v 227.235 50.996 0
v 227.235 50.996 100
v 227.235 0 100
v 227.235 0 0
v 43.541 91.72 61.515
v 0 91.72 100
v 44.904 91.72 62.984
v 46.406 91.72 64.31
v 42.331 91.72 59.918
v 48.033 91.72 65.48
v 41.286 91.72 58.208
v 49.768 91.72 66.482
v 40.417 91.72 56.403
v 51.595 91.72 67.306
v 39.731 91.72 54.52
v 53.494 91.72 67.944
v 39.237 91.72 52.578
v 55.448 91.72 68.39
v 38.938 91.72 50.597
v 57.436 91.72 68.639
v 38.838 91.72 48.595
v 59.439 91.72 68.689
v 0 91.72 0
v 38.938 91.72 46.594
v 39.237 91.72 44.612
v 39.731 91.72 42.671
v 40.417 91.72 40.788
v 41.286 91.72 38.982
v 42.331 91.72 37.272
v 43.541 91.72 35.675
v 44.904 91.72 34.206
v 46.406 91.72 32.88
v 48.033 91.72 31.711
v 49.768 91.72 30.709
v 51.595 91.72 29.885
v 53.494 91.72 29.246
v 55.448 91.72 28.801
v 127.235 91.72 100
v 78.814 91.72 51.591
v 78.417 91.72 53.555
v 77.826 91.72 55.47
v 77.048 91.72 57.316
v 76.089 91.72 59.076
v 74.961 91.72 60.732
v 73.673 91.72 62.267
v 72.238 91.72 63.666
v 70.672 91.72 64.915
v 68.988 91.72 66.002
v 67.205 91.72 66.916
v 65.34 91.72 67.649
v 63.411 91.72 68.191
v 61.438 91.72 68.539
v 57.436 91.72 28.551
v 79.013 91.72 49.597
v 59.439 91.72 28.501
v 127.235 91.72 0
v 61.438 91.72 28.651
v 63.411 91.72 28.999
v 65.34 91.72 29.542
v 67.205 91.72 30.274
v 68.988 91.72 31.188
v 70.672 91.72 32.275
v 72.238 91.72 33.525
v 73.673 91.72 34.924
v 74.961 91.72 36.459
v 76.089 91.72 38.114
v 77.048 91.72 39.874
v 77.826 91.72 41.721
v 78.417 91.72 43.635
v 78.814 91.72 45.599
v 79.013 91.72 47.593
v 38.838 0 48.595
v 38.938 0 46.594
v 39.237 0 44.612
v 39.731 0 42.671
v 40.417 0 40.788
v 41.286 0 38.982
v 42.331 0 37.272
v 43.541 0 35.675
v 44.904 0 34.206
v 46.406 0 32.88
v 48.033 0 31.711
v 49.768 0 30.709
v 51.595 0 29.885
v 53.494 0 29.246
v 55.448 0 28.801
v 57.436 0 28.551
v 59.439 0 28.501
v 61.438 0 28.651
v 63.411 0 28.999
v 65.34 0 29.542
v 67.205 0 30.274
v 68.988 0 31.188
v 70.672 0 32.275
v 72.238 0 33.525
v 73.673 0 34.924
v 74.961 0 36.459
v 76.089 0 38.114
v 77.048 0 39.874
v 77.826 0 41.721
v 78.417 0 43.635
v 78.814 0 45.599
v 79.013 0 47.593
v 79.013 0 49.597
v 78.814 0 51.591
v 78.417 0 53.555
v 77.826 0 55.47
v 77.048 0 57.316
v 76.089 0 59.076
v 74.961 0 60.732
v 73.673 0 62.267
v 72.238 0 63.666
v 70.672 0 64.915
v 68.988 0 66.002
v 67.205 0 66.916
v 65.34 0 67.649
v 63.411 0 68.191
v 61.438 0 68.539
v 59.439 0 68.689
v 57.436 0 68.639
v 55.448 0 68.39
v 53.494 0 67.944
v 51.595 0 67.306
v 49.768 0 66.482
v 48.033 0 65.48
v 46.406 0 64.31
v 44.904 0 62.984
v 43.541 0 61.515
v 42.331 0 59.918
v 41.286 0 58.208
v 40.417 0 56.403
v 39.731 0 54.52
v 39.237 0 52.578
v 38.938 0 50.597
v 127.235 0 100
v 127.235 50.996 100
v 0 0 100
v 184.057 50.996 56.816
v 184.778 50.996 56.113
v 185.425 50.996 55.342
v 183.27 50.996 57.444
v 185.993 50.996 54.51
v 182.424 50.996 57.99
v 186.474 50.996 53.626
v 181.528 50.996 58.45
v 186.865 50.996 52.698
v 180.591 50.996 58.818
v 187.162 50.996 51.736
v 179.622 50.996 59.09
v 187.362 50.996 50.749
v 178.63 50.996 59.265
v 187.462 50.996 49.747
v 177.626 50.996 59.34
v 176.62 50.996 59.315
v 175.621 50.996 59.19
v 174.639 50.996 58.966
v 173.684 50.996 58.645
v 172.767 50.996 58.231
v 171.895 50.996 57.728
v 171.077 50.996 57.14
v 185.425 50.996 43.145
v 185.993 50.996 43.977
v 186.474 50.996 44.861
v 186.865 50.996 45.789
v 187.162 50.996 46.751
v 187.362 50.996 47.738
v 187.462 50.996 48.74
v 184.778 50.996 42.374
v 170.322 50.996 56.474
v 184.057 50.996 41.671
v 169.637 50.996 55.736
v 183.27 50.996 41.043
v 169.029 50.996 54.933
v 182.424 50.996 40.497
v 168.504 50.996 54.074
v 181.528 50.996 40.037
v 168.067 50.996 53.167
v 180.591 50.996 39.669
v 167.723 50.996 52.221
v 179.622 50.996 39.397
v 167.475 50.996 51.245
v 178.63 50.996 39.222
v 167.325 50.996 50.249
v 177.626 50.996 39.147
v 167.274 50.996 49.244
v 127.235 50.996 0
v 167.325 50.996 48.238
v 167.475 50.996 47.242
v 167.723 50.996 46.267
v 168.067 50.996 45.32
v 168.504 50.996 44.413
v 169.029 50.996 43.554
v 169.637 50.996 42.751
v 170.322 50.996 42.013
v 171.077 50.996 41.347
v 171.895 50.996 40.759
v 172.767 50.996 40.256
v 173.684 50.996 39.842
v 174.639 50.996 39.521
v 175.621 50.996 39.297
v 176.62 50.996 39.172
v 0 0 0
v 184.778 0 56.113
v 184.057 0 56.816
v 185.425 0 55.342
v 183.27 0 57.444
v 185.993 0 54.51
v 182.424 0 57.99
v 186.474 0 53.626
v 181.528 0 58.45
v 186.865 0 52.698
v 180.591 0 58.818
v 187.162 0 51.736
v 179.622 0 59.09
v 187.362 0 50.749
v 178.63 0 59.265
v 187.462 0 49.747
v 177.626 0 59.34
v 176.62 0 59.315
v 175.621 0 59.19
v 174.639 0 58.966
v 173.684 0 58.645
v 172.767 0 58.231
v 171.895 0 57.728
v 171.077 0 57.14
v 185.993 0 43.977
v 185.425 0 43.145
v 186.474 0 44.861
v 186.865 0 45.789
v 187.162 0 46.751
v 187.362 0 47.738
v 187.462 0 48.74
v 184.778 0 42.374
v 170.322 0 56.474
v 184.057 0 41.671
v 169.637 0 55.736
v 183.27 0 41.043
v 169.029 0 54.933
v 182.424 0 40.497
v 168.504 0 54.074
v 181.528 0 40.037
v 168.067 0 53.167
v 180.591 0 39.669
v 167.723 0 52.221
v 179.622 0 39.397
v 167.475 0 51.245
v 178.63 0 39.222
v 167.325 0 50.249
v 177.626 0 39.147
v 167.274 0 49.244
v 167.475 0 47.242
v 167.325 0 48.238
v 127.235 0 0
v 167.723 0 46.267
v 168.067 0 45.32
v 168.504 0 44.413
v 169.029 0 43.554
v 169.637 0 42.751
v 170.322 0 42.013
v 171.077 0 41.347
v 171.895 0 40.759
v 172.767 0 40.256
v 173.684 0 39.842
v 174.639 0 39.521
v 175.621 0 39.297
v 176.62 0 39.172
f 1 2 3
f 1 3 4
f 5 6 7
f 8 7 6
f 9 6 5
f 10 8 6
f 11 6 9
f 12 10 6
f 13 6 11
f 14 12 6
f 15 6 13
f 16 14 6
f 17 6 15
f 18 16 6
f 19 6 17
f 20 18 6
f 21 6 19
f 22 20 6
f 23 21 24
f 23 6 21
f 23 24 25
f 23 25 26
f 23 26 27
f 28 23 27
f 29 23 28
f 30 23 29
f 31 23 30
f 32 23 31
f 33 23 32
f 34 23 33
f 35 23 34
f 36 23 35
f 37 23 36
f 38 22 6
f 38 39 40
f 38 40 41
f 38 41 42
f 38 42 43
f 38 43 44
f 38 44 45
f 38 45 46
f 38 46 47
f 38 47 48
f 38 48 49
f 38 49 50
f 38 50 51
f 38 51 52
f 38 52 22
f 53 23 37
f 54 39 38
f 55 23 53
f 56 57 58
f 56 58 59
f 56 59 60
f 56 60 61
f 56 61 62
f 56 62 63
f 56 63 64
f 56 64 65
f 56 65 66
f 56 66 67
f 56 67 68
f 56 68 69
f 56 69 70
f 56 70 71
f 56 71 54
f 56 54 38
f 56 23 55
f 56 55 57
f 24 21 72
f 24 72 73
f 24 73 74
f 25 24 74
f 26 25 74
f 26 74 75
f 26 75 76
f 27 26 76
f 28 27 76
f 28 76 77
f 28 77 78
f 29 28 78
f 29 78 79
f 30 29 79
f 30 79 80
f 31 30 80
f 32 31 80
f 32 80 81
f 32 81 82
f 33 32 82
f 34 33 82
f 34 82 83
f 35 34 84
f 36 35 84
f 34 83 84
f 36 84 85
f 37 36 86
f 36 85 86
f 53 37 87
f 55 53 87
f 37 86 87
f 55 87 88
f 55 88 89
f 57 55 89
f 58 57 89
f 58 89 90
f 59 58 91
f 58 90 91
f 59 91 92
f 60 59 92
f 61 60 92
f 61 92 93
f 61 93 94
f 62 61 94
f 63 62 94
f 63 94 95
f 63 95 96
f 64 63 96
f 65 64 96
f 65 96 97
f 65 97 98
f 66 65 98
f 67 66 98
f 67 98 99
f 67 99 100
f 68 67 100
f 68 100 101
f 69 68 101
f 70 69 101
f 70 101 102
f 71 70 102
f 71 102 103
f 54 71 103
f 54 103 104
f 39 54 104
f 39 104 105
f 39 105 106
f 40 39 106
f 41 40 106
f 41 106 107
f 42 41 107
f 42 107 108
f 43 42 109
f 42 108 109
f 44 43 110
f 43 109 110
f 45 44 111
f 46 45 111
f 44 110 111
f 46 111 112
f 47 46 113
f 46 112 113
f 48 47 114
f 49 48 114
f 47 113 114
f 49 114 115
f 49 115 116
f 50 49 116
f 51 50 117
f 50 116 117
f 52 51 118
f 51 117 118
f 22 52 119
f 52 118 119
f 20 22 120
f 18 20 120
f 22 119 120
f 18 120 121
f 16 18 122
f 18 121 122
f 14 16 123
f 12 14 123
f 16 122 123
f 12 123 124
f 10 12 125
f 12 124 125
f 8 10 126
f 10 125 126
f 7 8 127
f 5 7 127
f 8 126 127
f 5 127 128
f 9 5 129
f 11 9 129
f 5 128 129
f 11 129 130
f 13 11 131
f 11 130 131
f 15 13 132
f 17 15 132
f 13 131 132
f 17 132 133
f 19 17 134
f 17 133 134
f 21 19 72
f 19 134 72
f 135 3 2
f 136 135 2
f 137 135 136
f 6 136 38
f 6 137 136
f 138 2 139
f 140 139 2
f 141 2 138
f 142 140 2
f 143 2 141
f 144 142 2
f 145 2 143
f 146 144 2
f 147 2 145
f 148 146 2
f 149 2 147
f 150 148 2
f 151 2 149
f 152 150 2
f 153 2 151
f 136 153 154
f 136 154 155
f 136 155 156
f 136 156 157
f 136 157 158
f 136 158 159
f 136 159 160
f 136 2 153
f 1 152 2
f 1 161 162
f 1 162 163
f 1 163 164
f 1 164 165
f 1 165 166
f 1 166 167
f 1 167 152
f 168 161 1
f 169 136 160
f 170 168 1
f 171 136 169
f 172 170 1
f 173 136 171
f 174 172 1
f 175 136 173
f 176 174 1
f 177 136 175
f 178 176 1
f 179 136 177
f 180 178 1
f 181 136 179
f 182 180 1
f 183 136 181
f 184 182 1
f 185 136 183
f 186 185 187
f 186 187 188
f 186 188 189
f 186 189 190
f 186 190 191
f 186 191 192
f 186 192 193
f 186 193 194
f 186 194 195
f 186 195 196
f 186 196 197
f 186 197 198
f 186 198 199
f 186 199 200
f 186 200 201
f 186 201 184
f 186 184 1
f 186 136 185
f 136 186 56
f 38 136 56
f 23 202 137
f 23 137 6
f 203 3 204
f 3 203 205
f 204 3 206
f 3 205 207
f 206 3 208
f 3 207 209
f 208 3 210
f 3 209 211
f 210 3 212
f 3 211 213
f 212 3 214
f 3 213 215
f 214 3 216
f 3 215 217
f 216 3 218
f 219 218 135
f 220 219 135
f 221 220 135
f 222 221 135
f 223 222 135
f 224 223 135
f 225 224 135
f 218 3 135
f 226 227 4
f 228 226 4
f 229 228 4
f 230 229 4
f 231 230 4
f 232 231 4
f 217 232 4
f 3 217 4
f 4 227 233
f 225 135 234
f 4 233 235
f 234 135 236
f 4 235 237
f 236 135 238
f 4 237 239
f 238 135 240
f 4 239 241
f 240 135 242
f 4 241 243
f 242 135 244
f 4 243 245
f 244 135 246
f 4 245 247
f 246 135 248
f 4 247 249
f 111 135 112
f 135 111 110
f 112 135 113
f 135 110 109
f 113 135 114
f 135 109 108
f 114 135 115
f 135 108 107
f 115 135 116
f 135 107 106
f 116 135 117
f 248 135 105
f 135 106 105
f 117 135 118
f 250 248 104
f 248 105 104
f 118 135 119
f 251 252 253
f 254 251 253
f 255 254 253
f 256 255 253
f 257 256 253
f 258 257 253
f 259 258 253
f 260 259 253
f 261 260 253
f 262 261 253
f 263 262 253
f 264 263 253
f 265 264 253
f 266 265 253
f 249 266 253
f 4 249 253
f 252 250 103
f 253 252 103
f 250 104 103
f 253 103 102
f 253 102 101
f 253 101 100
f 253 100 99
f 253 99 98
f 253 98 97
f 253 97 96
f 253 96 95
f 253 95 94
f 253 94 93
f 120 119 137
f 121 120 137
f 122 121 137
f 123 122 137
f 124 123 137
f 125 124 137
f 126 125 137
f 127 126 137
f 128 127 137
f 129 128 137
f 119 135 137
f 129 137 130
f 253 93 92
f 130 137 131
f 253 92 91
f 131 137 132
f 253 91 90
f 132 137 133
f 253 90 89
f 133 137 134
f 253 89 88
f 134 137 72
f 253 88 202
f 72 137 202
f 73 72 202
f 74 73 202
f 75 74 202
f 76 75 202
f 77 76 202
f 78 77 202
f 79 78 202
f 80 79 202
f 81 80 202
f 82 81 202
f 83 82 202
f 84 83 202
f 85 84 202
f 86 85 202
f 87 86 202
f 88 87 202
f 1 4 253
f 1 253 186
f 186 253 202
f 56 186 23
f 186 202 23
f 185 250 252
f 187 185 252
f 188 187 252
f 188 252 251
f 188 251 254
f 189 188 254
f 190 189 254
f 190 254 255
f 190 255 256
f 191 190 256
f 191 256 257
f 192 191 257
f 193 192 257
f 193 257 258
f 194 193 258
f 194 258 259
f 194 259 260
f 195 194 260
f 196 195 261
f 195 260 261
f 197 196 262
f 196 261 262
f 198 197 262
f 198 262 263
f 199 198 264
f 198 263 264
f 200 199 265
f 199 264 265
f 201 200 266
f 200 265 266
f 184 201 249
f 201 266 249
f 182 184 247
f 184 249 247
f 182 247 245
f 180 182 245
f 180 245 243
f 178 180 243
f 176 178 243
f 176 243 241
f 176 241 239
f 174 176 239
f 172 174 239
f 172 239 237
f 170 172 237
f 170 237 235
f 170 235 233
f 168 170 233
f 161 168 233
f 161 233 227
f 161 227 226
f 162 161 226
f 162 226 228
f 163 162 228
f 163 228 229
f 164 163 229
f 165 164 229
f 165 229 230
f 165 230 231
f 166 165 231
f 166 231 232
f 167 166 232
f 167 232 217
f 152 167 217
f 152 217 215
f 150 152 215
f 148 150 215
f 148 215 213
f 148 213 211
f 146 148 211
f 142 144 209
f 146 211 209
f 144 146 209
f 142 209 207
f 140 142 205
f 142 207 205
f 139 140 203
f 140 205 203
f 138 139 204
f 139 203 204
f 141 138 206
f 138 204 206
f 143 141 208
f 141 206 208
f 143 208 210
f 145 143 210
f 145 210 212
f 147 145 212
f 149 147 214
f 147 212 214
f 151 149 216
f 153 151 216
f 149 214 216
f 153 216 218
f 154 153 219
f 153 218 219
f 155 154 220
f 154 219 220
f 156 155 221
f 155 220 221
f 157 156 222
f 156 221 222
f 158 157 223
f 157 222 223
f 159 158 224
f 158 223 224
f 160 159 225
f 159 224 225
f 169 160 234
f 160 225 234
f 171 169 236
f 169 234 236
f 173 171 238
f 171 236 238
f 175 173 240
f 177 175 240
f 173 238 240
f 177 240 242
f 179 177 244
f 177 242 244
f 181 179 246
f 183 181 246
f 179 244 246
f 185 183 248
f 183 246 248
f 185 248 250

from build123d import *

# Parameters (mm, degrees)
SKETCH1_W             = 127.235427394
SKETCH1_H             = 91.719523319
BOSS_EXTRUDE1_DEPTH   = 100
SKETCH2_W             = 100
SKETCH2_H             = 50.996346368
BOSS_EXTRUDE2_DEPTH   = 100
F_1_0MM_DOWEL_HOLE1_D = 20.2
F_1_0MM_DOWEL_HOLE2_D = 40.2


with BuildPart() as part:
    # Sketch1 → Boss-Extrude1 (new body)
    with BuildSketch(Plane.XY):
        with Locations((63.617713697, 45.85976166)):
            Rectangle(SKETCH1_W, SKETCH1_H)
    extrude(amount=BOSS_EXTRUDE1_DEPTH)

    # Sketch2 → Boss-Extrude2 (add)
    with BuildSketch(Plane(origin=(127.235427394, 0, 0), x_dir=(0, 0, -1), z_dir=(1, 0, 0))):
        with Locations((-50, 25.498173184)):
            Rectangle(SKETCH2_W, SKETCH2_H)
    extrude(amount=BOSS_EXTRUDE2_DEPTH)

    # Ø1.0mm Dowel Hole1 (through all)
    with Locations(Plane(origin=(0, 50.996346368, 0), x_dir=(1, 0, 0), z_dir=(0, 1, 0))):
        with Locations((177.374375047, -49.243565035)):
            Hole(F_1_0MM_DOWEL_HOLE1_D / 2)

    # Ø1.0mm Dowel Hole2 (through all)
    with Locations(Plane(origin=(0, 91.719523319, 0), x_dir=(1, 0, 0), z_dir=(0, 1, 0))):
        with Locations((58.93827193, -48.595192208)):
            Hole(F_1_0MM_DOWEL_HOLE2_D / 2)


solid = part.part
